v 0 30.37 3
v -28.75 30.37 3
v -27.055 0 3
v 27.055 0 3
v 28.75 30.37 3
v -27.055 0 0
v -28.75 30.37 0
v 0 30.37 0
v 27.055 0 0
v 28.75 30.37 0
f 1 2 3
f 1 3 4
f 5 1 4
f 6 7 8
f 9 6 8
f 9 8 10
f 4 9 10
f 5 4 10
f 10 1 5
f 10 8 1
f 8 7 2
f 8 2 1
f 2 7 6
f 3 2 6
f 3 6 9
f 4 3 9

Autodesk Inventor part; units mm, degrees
ref_plane "YZ Plane" through (0, 0, 0) normal (1, 0, 0) x (0, 1, 0)
ref_plane "XZ Plane" through (0, 0, 0) normal (0, 1, 0) x (-1, 0, 0)
ref_plane "XY Plane" through (0, 0, 0) normal (0, 0, 1) x (1, 0, 0)
sketch "Sketch1" plane through (0, 0, 0) normal (0, 0, 1) x (1, 0, 0)
  line L0 (-27.055, 0) -> (27.055, 0)
  line L1 (-28.75, 30.37) -> (28.75, 30.37)
  line L2 (27.055, 0) -> (28.75, 30.37)
  line L3 (-28.75, 30.37) -> (-27.055, 0)
  line L4 (0, 30.37) -> (0, 16.4508)
  point P0 (0, 0)
  point P1 (0, 0)
  dimension "d0" = 54.11
  dimension "d1" = 57.5
  dimension "d2" = 30.37
  dimension "d3" = 0
extrude "Extrusion1" add sketch "Sketch1" along normal blind 3
properties part number "F"
